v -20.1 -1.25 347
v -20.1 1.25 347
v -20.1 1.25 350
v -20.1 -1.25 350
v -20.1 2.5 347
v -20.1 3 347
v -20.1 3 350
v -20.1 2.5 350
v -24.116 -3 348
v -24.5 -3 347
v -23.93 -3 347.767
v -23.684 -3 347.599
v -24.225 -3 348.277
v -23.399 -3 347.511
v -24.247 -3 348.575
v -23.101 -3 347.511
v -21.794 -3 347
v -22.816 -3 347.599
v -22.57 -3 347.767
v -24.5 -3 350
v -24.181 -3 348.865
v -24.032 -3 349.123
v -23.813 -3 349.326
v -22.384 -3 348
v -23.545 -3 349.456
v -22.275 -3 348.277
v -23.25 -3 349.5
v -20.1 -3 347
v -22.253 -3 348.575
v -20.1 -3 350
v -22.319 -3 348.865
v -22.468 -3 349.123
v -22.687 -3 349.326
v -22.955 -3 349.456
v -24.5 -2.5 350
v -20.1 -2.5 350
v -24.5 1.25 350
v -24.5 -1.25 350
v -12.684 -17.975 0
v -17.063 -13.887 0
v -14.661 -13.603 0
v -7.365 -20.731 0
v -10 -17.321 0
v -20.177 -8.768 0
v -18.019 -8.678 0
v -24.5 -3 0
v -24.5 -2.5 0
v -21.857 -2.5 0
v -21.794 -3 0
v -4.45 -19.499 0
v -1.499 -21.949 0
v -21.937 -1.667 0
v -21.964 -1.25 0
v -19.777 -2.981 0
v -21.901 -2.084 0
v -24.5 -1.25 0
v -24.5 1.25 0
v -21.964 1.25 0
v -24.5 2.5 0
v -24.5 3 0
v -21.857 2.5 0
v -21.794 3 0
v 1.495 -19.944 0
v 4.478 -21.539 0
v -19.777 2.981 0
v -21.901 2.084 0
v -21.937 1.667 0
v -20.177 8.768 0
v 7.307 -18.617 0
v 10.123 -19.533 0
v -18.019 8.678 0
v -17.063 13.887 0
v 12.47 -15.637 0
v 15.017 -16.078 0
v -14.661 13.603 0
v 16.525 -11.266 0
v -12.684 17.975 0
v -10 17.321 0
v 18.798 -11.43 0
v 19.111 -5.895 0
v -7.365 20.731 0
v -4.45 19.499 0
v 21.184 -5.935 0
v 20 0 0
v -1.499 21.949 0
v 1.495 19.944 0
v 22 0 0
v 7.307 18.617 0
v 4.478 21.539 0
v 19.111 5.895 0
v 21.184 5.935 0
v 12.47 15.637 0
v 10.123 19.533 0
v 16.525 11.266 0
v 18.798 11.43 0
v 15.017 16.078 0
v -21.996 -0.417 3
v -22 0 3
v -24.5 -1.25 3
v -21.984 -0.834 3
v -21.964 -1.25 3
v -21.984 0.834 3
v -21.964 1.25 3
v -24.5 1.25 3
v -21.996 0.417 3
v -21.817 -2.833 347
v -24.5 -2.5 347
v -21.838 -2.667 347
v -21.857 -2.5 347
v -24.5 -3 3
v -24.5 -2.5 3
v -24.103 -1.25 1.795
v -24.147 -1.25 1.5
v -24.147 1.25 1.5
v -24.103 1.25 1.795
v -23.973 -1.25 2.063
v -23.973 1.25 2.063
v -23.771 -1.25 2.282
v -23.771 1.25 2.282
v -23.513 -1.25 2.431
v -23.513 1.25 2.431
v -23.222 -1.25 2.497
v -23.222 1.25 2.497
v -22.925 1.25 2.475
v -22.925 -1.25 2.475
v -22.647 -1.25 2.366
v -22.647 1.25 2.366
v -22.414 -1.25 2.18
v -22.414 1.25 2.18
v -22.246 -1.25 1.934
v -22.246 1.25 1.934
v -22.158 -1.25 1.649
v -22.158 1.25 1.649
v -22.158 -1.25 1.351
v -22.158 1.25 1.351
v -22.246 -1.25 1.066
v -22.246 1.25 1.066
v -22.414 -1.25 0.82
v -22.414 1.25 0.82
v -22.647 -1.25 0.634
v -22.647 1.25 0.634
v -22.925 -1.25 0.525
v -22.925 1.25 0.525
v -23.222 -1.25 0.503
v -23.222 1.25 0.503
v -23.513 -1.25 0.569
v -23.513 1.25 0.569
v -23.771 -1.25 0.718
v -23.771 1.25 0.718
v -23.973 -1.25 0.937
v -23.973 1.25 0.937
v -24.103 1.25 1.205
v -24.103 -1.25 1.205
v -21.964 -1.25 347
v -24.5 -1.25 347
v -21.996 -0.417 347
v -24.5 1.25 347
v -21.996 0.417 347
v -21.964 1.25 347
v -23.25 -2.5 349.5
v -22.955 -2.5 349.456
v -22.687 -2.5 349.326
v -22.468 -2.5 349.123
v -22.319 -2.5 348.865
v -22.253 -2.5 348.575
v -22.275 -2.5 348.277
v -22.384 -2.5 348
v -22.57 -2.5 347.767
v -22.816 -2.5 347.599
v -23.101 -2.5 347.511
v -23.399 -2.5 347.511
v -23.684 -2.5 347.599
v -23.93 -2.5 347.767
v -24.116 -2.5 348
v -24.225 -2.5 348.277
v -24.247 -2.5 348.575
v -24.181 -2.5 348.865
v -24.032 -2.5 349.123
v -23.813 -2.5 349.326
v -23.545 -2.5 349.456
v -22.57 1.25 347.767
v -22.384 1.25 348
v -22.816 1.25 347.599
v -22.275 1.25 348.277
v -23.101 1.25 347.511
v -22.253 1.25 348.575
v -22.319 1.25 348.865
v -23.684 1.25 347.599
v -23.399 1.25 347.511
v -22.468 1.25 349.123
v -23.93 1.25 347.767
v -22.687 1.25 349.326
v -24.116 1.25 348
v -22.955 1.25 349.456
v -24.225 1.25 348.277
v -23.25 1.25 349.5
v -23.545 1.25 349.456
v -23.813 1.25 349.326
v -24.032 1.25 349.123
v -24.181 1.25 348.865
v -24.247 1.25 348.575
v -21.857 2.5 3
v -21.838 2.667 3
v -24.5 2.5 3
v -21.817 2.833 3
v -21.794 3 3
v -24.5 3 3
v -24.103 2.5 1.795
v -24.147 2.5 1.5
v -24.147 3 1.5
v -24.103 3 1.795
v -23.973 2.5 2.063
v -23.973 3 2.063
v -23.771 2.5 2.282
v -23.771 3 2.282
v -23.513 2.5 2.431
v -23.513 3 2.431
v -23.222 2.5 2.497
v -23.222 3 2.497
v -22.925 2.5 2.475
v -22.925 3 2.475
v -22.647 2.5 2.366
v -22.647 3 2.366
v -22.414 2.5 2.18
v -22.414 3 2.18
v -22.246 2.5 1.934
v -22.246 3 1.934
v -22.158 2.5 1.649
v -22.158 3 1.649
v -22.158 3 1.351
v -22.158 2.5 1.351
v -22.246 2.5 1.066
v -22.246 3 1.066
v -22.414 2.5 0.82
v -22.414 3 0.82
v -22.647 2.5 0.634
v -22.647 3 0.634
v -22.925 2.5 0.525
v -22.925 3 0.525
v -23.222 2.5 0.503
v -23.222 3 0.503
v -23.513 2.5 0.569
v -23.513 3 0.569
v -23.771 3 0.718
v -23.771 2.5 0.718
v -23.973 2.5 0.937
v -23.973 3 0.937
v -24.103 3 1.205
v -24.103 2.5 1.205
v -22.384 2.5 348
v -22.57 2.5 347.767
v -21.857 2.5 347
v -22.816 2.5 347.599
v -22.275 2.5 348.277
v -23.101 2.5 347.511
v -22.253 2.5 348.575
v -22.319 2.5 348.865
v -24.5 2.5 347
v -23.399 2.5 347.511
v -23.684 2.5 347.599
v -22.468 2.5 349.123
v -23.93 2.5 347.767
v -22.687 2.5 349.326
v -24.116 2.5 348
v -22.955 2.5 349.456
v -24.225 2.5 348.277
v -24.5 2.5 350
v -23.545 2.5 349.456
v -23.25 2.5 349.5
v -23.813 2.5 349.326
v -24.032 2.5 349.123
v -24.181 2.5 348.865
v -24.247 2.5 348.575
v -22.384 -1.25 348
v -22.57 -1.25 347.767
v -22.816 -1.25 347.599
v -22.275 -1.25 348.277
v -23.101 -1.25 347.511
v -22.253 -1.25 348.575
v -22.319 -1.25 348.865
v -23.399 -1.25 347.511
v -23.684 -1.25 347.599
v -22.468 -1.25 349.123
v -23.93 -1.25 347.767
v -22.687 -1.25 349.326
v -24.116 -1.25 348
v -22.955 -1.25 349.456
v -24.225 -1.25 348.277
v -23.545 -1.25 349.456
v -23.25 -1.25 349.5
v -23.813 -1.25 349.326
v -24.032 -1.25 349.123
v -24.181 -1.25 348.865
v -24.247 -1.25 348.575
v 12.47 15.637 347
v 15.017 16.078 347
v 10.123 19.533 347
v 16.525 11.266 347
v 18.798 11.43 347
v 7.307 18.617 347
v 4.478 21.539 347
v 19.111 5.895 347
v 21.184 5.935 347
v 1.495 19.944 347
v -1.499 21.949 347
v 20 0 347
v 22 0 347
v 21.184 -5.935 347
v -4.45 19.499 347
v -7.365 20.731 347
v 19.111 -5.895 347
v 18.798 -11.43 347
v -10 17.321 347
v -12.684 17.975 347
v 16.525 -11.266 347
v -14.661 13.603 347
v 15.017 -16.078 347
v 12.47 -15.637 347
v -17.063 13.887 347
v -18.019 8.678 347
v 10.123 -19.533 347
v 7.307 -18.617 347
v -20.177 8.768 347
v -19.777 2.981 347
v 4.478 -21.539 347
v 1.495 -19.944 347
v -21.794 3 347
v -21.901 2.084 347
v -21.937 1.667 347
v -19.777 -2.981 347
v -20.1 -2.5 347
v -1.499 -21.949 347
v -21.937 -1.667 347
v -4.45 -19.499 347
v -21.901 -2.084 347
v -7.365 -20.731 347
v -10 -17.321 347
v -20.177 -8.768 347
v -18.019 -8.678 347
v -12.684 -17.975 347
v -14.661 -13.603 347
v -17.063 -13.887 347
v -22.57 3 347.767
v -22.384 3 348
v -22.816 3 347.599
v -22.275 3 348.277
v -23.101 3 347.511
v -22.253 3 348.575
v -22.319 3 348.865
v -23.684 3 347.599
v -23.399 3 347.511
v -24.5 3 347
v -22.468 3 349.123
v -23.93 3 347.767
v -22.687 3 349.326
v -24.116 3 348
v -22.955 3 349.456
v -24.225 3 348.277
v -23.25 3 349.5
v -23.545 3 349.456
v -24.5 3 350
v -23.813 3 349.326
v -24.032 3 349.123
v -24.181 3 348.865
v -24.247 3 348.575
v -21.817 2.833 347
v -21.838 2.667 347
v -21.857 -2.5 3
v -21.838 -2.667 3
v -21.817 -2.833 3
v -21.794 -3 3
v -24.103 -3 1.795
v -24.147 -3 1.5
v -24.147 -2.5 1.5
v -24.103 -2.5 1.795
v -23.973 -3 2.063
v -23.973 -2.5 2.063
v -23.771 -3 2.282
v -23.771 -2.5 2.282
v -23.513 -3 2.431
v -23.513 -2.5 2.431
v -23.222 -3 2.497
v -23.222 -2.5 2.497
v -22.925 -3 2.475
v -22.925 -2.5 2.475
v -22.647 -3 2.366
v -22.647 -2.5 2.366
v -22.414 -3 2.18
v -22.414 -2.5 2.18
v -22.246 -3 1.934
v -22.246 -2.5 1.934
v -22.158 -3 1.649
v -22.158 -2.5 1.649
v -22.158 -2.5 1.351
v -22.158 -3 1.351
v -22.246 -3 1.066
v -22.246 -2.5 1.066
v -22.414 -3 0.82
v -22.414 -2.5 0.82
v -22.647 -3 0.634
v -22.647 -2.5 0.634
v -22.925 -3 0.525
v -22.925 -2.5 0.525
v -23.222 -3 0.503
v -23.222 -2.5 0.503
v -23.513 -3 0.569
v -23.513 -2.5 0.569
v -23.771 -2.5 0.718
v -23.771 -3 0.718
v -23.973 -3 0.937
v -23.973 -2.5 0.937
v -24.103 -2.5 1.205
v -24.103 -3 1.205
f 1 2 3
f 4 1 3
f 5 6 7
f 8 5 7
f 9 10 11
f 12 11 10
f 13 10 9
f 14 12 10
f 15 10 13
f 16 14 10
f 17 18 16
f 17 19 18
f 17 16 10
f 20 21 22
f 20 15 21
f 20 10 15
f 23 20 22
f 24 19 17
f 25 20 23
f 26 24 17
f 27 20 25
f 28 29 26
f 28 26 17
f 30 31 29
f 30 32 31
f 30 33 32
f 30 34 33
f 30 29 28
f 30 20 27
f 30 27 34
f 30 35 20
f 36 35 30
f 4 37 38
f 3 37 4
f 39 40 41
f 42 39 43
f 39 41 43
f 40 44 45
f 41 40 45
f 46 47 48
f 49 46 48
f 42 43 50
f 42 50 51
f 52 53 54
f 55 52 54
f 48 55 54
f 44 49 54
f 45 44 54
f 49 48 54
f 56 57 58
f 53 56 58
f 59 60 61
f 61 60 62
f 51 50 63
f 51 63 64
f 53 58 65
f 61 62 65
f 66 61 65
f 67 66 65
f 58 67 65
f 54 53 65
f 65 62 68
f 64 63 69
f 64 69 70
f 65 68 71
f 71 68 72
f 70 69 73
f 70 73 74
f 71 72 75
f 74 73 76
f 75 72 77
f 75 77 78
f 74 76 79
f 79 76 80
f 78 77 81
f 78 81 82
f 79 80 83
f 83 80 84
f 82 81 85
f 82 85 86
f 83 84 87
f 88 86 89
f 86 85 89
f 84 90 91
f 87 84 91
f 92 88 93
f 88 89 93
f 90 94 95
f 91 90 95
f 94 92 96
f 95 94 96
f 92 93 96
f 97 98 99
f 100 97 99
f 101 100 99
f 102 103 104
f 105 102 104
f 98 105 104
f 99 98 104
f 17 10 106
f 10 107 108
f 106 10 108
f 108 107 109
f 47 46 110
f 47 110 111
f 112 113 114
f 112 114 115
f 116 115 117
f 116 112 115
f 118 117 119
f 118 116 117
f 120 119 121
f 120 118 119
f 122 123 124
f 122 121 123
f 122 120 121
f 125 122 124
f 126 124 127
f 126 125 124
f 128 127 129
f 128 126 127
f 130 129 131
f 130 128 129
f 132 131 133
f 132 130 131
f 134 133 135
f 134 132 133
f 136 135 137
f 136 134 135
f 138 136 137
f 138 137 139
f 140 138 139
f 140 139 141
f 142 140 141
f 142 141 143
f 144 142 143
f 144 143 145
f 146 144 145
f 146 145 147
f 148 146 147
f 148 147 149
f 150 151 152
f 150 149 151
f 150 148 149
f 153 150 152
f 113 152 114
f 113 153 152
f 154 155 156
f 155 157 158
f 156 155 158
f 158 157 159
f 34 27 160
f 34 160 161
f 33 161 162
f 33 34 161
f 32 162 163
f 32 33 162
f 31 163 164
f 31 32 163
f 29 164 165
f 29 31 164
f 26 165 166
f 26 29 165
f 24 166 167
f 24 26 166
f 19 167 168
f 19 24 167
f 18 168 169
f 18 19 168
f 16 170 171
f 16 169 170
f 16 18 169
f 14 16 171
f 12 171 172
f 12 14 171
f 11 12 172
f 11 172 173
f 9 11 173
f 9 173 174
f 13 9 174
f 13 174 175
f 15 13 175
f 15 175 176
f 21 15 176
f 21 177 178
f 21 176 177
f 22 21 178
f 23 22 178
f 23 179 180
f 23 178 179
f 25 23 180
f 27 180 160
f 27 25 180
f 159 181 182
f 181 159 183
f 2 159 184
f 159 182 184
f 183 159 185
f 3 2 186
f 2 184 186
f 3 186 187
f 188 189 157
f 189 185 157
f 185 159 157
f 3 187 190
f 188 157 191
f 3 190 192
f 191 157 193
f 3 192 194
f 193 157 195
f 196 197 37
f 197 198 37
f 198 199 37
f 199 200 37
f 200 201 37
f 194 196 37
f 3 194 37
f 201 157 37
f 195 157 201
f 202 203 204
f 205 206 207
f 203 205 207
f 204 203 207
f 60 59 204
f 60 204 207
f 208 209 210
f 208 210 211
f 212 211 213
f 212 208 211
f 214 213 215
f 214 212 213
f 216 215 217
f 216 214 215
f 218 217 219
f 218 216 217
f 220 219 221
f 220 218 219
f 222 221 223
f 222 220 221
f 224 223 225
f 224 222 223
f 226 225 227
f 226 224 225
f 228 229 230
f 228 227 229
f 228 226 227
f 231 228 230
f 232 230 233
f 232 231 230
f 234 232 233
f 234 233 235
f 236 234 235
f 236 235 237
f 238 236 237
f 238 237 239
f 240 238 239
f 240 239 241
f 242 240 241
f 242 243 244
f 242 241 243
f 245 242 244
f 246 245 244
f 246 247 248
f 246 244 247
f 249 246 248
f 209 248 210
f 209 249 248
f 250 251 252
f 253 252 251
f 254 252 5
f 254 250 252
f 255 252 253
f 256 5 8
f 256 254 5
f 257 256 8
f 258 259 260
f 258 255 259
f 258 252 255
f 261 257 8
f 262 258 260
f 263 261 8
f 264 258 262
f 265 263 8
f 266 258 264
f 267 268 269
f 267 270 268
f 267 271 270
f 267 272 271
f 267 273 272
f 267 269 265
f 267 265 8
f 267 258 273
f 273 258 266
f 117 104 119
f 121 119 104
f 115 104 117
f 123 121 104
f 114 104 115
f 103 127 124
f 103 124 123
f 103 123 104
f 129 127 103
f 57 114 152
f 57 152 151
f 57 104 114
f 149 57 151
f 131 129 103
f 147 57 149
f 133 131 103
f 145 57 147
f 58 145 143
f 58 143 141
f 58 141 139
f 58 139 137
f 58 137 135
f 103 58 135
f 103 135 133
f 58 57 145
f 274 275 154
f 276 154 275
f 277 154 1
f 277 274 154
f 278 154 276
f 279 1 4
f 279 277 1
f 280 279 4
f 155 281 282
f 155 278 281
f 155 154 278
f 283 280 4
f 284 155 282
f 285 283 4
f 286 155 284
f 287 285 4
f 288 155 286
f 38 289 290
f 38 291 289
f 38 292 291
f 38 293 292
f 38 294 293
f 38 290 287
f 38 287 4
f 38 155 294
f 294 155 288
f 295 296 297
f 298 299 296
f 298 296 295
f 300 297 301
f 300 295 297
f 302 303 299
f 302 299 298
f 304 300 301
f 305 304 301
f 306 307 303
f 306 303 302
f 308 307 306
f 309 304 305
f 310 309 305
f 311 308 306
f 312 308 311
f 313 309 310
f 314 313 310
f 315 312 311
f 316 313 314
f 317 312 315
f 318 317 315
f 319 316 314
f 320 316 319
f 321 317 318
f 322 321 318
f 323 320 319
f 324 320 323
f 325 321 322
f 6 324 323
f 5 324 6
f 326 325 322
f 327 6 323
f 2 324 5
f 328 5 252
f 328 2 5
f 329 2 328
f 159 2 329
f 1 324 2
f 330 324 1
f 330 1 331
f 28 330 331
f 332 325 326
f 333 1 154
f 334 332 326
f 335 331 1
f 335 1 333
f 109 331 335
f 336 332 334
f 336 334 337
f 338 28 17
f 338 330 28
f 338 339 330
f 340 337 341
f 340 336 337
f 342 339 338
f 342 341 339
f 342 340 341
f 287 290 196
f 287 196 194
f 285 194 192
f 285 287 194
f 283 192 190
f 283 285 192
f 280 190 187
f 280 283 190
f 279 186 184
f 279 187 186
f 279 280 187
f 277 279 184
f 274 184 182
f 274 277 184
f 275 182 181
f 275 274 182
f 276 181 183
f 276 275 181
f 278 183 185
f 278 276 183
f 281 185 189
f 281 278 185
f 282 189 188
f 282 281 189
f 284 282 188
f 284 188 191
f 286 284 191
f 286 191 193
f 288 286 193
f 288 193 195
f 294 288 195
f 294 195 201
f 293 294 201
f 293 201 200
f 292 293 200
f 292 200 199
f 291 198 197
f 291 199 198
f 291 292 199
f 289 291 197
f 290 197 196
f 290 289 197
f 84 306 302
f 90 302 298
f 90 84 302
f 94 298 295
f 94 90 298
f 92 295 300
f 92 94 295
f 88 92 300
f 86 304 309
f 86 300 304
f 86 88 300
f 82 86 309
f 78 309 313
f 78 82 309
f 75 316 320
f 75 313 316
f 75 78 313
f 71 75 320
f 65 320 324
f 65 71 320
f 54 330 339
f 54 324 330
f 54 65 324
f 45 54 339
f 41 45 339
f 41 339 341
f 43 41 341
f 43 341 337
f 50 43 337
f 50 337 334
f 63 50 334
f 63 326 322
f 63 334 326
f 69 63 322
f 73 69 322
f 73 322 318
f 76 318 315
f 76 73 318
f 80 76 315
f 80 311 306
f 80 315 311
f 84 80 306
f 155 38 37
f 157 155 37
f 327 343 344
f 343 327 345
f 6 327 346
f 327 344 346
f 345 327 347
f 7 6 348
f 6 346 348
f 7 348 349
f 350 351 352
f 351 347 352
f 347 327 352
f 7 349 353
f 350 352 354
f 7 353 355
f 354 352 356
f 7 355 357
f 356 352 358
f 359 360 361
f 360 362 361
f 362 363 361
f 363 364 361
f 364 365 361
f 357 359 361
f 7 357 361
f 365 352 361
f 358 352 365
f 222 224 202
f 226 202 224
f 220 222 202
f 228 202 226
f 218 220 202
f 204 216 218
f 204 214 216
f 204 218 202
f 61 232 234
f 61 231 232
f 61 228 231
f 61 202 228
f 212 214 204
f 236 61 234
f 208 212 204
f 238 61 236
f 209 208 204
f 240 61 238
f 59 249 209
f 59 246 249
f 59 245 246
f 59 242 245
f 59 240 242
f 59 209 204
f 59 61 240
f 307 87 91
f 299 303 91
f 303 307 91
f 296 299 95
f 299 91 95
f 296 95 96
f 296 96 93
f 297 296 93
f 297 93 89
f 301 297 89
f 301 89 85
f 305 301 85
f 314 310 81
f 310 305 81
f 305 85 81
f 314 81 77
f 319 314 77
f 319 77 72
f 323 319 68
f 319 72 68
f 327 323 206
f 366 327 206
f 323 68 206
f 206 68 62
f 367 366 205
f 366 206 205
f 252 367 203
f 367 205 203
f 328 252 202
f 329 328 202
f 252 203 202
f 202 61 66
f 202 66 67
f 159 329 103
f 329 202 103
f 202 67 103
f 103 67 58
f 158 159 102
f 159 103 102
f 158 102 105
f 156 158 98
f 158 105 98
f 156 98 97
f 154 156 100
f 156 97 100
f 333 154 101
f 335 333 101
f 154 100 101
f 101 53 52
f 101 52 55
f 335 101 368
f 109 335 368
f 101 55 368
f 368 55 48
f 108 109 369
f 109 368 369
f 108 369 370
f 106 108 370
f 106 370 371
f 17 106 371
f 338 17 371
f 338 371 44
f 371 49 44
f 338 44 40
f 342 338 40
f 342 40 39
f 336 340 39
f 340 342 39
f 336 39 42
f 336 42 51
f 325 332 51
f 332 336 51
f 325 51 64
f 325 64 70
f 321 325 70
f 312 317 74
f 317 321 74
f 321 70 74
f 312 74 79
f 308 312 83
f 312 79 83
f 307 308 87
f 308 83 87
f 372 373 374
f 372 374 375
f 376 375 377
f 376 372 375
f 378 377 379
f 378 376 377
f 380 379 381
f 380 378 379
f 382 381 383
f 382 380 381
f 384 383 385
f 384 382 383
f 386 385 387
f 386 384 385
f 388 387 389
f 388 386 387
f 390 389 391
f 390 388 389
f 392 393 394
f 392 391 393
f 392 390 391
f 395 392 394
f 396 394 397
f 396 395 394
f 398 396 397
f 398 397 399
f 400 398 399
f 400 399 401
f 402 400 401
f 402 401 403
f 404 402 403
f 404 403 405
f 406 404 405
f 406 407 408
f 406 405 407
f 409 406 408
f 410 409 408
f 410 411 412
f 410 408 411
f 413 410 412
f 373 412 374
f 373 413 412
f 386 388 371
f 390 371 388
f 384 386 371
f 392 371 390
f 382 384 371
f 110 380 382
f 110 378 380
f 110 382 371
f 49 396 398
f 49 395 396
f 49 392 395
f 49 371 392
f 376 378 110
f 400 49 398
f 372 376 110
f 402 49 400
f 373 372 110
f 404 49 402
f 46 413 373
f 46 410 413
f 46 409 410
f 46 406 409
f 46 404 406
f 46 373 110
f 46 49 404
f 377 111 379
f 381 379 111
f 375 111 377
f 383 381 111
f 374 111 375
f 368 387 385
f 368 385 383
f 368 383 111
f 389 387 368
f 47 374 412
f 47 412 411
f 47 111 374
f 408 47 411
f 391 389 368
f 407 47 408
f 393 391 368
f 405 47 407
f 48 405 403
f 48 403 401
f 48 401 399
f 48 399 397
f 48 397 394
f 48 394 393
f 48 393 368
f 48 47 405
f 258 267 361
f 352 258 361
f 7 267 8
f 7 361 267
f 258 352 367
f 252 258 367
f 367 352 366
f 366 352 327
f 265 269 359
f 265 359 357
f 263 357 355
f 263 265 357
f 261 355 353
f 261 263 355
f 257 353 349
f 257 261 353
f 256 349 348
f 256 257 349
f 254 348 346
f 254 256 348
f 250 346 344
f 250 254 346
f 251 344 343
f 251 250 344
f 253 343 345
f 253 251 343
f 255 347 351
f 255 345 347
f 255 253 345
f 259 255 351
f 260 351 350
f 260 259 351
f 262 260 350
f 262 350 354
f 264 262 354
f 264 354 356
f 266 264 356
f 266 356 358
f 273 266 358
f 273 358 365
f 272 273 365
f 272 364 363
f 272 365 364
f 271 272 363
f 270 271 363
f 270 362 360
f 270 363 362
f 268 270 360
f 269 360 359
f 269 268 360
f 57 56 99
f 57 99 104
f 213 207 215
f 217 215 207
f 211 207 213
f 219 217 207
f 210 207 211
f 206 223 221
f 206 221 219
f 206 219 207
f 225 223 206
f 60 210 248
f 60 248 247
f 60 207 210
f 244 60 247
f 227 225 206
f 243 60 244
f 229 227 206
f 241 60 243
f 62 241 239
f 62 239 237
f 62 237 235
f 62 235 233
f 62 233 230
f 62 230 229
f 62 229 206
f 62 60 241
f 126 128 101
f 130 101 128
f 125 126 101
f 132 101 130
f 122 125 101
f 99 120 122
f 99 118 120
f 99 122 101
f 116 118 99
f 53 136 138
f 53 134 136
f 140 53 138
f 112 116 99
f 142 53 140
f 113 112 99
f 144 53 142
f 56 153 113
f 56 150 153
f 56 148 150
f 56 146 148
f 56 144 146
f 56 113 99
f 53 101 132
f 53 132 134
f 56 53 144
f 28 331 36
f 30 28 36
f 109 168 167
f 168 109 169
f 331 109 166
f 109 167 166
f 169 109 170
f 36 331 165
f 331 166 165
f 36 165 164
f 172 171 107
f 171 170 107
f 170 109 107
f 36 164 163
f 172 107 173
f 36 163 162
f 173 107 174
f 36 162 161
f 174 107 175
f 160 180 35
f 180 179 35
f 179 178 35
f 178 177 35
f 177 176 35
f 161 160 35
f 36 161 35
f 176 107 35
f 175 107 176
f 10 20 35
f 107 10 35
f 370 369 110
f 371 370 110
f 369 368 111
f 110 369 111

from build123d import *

# Parameters (mm, degrees)
SKETCH1_R               = 22
SKETCH1_R_2             = 20
BOSS_EXTRUDE1_DEPTH     = 350
BOSS_EXTRUDE2_DEPTH     = 3
CUT_EXTRUDE1_DEPTH      = 352.746002109
CUT_EXTRUDE1_DEPTH_BACK = 352.746002109
SKETCH3_R               = 1
SKETCH4_W               = 2.837375188
SKETCH4_H               = 2.5
SKETCH4_W_2             = 2.705505282
SKETCH4_H_2             = 0.5
BOSS_EXTRUDE3_DEPTH     = 3
CUT_EXTRUDE2_DEPTH      = 352.746002109
CUT_EXTRUDE2_DEPTH_BACK = 352.746002109
SKETCH5_R               = 1
CUT_EXTRUDE3_START      = -3
SKETCH6_R               = 22
CUT_EXTRUDE3_DEPTH      = 3
SKETCH7_W               = 3
SKETCH7_H               = 6
BOSS_EXTRUDE4_DEPTH     = 4.4
CUT_EXTRUDE4_DEPTH      = 352.746002109
CUT_EXTRUDE4_DEPTH_BACK = 352.746002109
SKETCH8_R               = 1
SKETCH9_W               = 3
SKETCH9_H               = 1.25
CUT_EXTRUDE5_DEPTH      = 4.4


with BuildPart() as part:
    # Sketch1 → Boss-Extrude1 (new body)
    with BuildSketch(Plane.XY):
        Circle(SKETCH1_R)
        Circle(SKETCH1_R_2, mode=Mode.SUBTRACT)
    extrude(amount=BOSS_EXTRUDE1_DEPTH)

    # Sketch2 → Boss-Extrude2 (add)
    with BuildSketch(Plane(origin=(0, 0, 0), x_dir=(-1, 0, 0), z_dir=(0, 0, -1))):
        with BuildLine():
            Line((24.5, 3), (21.794494718, 3))
            ThreePointArc((21.794494718, 3), (21.827425588, 2.750180393), (21.857492994, 2.5))
            Line((21.857492994, 2.5), (24.5, 2.5))
            Line((24.5, 2.5), (24.5, 3))
        make_face()
        with BuildLine():
            Line((24.5, 1.25), (21.96445993, 1.25))
            ThreePointArc((21.96445993, 1.25), (21.991113188, 0.625252568), (22, 0))
            ThreePointArc((22, 0), (21.991113188, -0.625252568), (21.96445993, -1.25))
            Line((21.96445993, -1.25), (24.5, -1.25))
            Line((24.5, -1.25), (24.5, 1.25))
        make_face()
        with BuildLine():
            ThreePointArc((21.857492994, -2.5), (21.827425588, -2.750180393), (21.794494718, -3))
            Line((21.794494718, -3), (24.5, -3))
            Line((24.5, -3), (24.5, -2.5))
            Line((24.5, -2.5), (21.857492994, -2.5))
        make_face()
    extrude(amount=-BOSS_EXTRUDE2_DEPTH)

    # Sketch3 → Cut-Extrude1 (cut, two sides: drawn at the far end of the back side and taken through both)
    with BuildSketch(Plane(origin=(0, 3, 0), x_dir=(1, 0, 0), z_dir=(0, 1, 0)).offset(-CUT_EXTRUDE1_DEPTH_BACK)):
        with Locations(Location((-23.147247359, -1.5, 0), (0, 0, 180))):
            Circle(SKETCH3_R)
    extrude(amount=CUT_EXTRUDE1_DEPTH + CUT_EXTRUDE1_DEPTH_BACK, mode=Mode.SUBTRACT)

    # Sketch4 → Boss-Extrude3 (add)
    with BuildSketch(Plane.XY.offset(350)):
        with Locations((-23.081312406, 0)):
            Rectangle(SKETCH4_W, SKETCH4_H)
        with Locations((-23.147247359, 2.75)):
            Rectangle(SKETCH4_W_2, SKETCH4_H_2)
        with Locations((-23.147247359, -2.75)):
            Rectangle(SKETCH4_W_2, SKETCH4_H_2)
    extrude(amount=-BOSS_EXTRUDE3_DEPTH)

    # Sketch5 → Cut-Extrude2 (cut, two sides: drawn at the far end of the back side and taken through both)
    with BuildSketch(Plane(origin=(0, 3, 0), x_dir=(1, 0, 0), z_dir=(0, 1, 0)).offset(-CUT_EXTRUDE2_DEPTH_BACK)):
        with Locations(Location((-23.147247359, -348.5, 0), (0, 0, 270))):
            Circle(SKETCH5_R)
    extrude(amount=CUT_EXTRUDE2_DEPTH + CUT_EXTRUDE2_DEPTH_BACK, mode=Mode.SUBTRACT)

    # Sketch6 → Cut-Extrude3 (cut)
    with BuildSketch(Plane.XY.offset(350).offset(CUT_EXTRUDE3_START)):
        with Locations(Location((0, 0, 0), (0, 0, 180))):
            Circle(SKETCH6_R)
    extrude(amount=CUT_EXTRUDE3_DEPTH, mode=Mode.SUBTRACT)


with BuildPart() as cut_extrude3_piece_1:
    # of the separate pieces the step leaves, piece 1, a body of its own (cut_extrude3_pieces)
    add(part.part.solids().sort_by_distance((22, 0, 0))[0])



with BuildPart() as cut_extrude3_piece_2:
    # of the separate pieces the step leaves, piece 2, a body of its own (cut_extrude3_pieces)
    add(part.part.solids().sort_by_distance((-24.5, 1.25, 347))[0])


with BuildPart() as cut_extrude3_piece_3:
    # of the separate pieces the step leaves, piece 3, a body of its own (cut_extrude3_pieces)
    add(part.part.solids().sort_by_distance((-24.5, -2.5, 347))[0])


with BuildPart() as cut_extrude3_piece_4:
    # of the separate pieces the step leaves, piece 4, a body of its own (cut_extrude3_pieces)
    add(part.part.solids().sort_by_distance((-24.5, 2.5, 347))[0])


with BuildPart() as cut_extrude3_piece_1_1:
    add(cut_extrude3_piece_1.part)

    add(cut_extrude3_piece_2.part)  # Boss-Extrude4 merges Cut-Extrude3 piece 2

    add(cut_extrude3_piece_3.part)  # Boss-Extrude4 merges Cut-Extrude3 piece 3

    add(cut_extrude3_piece_4.part)  # Boss-Extrude4 merges Cut-Extrude3 piece 4
    # Sketch7 → Boss-Extrude4 (add)
    with BuildSketch(Plane.ZY.offset(24.5)):
        with Locations((348.5, 0)):
            Rectangle(SKETCH7_W, SKETCH7_H)
    extrude(amount=-BOSS_EXTRUDE4_DEPTH)

    # Sketch8 → Cut-Extrude4 (cut, two sides: drawn at the far end of the back side and taken through both)
    with BuildSketch(Plane(origin=(0, 3, 0), x_dir=(1, 0, 0), z_dir=(0, 1, 0)).offset(-CUT_EXTRUDE4_DEPTH_BACK)):
        with Locations(Location((-23.25, -348.5, 0), (0, 0, 270))):
            Circle(SKETCH8_R)
    extrude(amount=CUT_EXTRUDE4_DEPTH + CUT_EXTRUDE4_DEPTH_BACK, mode=Mode.SUBTRACT)

    # Sketch9 → Cut-Extrude5 (cut)
    with BuildSketch(Plane.ZY.offset(24.5)):
        with Locations((348.5, 1.875)):
            Rectangle(SKETCH9_W, SKETCH9_H)
        with Locations((348.5, -1.875)):
            Rectangle(SKETCH9_W, SKETCH9_H)
    extrude(amount=-CUT_EXTRUDE5_DEPTH, mode=Mode.SUBTRACT)


solid = cut_extrude3_piece_1_1.part
